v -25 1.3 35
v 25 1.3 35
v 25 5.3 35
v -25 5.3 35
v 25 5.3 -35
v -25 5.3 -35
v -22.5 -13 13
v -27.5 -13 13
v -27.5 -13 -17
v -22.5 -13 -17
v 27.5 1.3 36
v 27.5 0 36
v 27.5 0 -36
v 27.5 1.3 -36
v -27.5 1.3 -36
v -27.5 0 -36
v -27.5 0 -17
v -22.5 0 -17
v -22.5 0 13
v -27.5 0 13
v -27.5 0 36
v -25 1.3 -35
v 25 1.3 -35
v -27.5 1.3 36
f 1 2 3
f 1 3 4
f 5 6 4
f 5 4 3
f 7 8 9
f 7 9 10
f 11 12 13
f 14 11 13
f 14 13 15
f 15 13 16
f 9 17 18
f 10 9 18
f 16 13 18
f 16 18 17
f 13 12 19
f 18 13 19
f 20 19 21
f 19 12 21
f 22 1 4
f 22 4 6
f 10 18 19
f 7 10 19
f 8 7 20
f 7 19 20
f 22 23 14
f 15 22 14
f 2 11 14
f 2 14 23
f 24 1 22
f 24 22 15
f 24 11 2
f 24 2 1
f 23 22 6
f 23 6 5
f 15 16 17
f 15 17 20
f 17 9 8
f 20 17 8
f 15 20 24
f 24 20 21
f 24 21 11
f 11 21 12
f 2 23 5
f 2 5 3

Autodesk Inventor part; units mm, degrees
ref_plane "YZ Plane" through (0, 0, 0) normal (1, 0, 0) x (0, 1, 0)
ref_plane "XZ Plane" through (0, 0, 0) normal (0, 1, 0) x (-1, 0, 0)
ref_plane "XY Plane" through (0, 0, 0) normal (0, 0, 1) x (1, 0, 0)
sketch "Sketch1" plane through (0, 0, 0) normal (0, 1, 0) x (-1, 0, 0)
  line L0 (27.5, 36) -> (-27.5, 36)
  line L1 (-27.5, 36) -> (-27.5, -36)
  line L2 (-27.5, -36) -> (27.5, -36)
  line L3 (27.5, -36) -> (27.5, 36)
  line L4 (27.5, 36) -> (-27.5, -36) construction
  line L5 (-27.5, 36) -> (27.5, -36) construction
  point P0 (0, 0)
  dimension "d0" = 55
  dimension "d1" = 72
extrude "Extrusion1" add sketch "Sketch1" along normal blind 1.3
sketch "Sketch2" plane through (0, 1.3, 0) normal (0, 1, 0) x (1, 0, 0)
  line L0 (-25, 35) -> (25, 35)
  line L1 (25, 35) -> (25, -35)
  line L2 (25, -35) -> (-25, -35)
  line L3 (-25, -35) -> (-25, 35)
  line L4 (-25, 35) -> (25, -35) construction
  line L5 (25, 35) -> (-25, -35) construction
  point P0 (0, 0)
  dimension "d4" = 70
  dimension "d5" = 50
extrude "Extrusion2" add sketch "Sketch2" along normal blind 4
sketch "Sketch3" plane through (0, 0, 0) normal (0, -1, 0) x (1, 0, 0)
  line L0 (-27.5, -17) -> (-22.5, -17)
  line L1 (-22.5, -17) -> (-22.5, 13)
  line L2 (-22.5, 13) -> (-27.5, 13)
  line L3 (-27.5, 13) -> (-27.5, -17)
  line L4 (27.5, -36) -> (-27.5, -36) projected
  line L5 (-27.5, -36) -> (-27.5, 36) projected
  point P0 (0, 0)
  dimension "d8" = 30
  dimension "d9" = 5
  dimension "d10" = 19
  dimension "d11" = 0
extrude "Extrusion3" add sketch "Sketch3" along normal blind 13
properties part number "display"
